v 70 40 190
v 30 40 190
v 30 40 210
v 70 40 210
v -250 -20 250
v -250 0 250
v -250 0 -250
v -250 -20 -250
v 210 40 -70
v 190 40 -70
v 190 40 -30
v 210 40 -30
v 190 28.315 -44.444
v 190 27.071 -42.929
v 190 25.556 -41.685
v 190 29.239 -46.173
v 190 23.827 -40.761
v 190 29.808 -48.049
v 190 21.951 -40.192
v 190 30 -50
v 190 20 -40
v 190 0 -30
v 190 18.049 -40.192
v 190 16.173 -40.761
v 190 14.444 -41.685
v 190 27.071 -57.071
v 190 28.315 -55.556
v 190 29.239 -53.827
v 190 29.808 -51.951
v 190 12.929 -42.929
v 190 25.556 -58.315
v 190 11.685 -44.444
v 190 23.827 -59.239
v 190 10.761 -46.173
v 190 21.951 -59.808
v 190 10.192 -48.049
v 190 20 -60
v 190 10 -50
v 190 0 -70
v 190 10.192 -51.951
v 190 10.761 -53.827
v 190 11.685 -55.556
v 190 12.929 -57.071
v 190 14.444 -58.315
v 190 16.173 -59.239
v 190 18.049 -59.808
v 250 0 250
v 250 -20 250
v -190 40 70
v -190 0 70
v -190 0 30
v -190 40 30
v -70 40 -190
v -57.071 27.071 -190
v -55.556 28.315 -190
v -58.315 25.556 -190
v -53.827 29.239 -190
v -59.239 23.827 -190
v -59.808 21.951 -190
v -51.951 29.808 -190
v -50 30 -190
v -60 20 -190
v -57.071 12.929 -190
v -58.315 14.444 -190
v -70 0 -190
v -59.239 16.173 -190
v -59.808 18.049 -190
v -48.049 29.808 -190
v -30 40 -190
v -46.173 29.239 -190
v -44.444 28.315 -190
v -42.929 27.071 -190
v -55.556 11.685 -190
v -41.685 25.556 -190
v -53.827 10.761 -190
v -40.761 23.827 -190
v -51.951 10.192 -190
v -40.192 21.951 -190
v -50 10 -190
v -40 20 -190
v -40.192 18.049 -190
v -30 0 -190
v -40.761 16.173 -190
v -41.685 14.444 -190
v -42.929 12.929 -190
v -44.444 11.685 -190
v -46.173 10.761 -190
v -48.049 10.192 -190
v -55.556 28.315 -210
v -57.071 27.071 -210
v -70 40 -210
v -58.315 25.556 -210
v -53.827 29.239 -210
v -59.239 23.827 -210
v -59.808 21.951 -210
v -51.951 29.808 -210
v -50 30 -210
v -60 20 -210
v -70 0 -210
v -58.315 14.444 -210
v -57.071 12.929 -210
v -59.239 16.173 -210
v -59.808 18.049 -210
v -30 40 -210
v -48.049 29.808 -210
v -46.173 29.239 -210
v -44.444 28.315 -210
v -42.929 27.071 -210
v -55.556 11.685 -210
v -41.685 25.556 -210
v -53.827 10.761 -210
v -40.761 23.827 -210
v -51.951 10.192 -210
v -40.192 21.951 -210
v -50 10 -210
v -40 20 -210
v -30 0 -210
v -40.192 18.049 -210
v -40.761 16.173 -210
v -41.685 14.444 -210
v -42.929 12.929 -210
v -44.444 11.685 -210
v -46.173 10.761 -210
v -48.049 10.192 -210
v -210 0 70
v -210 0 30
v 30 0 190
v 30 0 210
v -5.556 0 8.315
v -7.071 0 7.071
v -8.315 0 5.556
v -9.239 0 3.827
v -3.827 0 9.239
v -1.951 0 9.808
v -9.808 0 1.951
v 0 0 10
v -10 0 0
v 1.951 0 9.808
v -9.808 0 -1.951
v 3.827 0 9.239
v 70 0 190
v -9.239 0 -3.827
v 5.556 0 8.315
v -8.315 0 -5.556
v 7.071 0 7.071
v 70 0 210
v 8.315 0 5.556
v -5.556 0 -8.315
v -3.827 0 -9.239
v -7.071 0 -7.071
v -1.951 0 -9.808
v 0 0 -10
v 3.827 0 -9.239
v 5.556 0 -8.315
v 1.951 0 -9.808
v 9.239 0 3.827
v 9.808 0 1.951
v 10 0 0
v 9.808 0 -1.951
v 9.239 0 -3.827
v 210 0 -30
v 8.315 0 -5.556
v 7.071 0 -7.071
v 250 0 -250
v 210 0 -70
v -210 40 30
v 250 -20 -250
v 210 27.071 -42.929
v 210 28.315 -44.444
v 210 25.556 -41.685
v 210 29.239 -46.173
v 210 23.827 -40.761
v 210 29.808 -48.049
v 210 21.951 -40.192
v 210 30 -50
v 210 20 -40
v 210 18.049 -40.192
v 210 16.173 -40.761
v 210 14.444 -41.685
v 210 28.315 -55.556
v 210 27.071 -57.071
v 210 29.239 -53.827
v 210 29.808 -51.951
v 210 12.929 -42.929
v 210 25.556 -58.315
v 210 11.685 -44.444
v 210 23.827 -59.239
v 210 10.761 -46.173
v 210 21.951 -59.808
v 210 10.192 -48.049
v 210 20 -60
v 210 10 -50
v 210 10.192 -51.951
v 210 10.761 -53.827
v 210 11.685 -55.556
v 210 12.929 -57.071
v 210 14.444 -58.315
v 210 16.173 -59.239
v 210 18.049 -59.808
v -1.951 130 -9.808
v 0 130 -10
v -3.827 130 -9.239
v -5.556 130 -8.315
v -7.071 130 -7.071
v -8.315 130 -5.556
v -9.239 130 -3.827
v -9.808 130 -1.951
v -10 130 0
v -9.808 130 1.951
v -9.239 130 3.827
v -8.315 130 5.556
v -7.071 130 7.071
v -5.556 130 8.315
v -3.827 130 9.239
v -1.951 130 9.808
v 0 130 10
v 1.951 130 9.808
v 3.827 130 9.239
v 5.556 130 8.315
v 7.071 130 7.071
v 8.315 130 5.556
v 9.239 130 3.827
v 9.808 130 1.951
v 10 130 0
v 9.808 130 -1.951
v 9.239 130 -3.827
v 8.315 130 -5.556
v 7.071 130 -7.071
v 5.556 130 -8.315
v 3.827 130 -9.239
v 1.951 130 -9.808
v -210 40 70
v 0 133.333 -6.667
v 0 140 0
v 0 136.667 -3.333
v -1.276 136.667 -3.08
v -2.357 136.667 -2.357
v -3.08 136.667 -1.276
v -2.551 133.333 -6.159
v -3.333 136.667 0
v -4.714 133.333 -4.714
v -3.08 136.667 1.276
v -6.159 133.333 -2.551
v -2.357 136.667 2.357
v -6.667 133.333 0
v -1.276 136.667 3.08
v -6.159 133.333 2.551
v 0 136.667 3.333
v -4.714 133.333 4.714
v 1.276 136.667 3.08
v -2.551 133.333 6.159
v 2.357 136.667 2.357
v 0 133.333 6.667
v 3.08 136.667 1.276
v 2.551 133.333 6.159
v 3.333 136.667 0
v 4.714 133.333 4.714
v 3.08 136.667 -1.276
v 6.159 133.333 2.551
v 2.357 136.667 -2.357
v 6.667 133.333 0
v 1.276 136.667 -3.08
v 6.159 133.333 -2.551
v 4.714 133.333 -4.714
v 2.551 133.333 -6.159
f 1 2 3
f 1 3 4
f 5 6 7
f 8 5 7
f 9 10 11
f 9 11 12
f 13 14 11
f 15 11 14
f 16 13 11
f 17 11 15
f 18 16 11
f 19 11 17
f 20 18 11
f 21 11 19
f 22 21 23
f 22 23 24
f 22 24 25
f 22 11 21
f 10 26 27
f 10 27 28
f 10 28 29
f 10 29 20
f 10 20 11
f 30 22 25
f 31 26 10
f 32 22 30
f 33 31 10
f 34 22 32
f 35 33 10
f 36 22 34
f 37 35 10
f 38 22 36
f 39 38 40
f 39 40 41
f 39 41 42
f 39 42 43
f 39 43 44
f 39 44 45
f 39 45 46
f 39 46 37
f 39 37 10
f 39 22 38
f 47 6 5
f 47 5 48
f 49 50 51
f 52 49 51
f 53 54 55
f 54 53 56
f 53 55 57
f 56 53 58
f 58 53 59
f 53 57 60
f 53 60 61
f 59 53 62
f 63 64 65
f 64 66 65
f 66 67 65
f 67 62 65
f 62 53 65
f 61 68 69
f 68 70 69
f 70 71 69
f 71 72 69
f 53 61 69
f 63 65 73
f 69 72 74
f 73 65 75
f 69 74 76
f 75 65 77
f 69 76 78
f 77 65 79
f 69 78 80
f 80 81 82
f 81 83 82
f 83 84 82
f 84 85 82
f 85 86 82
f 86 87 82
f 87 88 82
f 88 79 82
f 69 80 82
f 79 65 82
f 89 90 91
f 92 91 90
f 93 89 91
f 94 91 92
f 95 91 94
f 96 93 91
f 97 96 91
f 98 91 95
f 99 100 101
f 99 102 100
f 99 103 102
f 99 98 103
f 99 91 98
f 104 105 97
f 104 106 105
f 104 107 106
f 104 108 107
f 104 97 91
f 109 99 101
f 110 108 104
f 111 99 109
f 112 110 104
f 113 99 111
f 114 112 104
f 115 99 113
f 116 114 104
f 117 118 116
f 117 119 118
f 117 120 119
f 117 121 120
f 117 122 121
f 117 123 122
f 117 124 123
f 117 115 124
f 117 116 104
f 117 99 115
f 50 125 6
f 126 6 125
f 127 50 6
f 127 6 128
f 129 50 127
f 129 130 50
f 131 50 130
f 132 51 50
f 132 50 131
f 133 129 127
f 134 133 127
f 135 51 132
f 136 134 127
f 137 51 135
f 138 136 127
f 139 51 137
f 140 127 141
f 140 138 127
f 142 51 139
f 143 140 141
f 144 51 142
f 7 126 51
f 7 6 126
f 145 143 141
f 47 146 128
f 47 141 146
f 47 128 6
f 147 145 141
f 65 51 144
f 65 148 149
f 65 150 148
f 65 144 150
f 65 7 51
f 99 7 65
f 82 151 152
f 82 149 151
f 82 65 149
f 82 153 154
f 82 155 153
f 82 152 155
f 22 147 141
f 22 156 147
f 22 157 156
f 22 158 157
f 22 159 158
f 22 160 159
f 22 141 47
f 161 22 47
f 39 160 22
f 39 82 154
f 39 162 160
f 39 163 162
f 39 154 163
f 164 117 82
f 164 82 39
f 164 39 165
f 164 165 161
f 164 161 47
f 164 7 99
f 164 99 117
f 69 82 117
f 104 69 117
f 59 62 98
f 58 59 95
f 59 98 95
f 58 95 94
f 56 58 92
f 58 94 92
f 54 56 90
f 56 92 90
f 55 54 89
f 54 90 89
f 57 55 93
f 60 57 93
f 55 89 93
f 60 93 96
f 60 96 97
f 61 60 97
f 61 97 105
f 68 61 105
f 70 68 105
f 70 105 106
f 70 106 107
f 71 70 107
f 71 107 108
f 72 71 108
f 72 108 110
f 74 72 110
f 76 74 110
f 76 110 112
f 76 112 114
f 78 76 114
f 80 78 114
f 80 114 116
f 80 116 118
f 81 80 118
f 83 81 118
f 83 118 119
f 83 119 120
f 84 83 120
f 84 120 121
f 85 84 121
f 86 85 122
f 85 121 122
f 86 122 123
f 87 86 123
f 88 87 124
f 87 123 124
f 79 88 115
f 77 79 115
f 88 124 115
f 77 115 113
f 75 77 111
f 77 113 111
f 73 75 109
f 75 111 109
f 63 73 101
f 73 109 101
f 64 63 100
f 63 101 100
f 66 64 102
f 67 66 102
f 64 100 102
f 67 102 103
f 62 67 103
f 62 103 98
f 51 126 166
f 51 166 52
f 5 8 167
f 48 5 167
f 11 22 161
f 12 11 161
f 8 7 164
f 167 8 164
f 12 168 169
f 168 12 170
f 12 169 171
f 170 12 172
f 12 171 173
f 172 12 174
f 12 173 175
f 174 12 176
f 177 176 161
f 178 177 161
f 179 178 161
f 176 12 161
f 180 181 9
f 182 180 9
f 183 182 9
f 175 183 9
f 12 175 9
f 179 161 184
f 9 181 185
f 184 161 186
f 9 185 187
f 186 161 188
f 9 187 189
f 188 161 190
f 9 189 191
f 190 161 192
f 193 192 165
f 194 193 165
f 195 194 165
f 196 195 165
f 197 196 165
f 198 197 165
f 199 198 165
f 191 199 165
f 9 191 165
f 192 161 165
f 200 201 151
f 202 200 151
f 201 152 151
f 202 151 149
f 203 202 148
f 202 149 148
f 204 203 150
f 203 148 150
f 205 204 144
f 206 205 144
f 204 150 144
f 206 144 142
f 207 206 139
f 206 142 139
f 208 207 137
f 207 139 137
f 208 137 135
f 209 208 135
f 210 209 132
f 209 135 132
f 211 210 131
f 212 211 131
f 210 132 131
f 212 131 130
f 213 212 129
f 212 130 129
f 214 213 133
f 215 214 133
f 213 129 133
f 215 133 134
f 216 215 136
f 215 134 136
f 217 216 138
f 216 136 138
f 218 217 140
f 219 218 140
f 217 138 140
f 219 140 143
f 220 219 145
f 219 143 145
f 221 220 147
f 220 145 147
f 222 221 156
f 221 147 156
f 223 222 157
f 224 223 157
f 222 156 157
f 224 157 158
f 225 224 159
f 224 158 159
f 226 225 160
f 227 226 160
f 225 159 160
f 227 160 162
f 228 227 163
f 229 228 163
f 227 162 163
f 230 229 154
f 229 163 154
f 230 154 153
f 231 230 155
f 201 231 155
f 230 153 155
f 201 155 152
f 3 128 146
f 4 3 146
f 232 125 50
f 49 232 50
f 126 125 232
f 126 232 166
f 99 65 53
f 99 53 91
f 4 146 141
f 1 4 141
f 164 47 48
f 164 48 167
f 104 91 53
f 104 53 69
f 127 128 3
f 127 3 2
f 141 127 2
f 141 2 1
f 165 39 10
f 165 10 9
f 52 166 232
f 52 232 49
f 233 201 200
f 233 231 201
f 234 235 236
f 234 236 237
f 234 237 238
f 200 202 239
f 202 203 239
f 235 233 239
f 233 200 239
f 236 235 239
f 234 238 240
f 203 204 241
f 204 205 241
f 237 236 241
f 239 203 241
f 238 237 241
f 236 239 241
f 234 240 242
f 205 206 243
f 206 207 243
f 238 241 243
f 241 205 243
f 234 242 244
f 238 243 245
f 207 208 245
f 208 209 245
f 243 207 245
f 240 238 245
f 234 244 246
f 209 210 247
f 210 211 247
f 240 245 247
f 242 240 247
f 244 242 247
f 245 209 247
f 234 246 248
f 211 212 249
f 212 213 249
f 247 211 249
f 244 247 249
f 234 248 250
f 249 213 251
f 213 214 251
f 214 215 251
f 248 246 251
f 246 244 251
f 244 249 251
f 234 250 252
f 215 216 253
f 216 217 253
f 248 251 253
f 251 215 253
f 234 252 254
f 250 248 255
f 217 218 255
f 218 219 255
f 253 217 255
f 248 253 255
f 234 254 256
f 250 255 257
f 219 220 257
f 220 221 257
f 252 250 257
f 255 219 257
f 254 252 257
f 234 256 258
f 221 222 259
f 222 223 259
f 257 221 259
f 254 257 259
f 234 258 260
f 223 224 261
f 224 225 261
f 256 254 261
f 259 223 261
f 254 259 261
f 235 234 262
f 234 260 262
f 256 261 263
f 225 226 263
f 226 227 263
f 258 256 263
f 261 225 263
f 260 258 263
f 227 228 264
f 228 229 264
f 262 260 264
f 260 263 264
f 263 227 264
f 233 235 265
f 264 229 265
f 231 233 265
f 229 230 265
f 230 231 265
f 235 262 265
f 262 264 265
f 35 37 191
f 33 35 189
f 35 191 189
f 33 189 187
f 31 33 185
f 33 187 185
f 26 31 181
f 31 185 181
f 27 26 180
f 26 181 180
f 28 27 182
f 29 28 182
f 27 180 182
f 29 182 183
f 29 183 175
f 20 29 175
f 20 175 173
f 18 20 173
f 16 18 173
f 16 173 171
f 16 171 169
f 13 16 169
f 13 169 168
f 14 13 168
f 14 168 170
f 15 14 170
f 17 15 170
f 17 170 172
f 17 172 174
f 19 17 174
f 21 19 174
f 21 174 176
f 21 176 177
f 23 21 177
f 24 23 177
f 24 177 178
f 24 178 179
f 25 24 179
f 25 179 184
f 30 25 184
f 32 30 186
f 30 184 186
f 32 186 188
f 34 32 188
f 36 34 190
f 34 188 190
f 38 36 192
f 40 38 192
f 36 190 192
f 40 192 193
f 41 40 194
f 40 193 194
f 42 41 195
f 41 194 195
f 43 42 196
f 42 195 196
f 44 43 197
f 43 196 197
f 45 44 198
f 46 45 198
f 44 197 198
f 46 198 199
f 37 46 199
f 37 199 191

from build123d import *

# Parameters (mm, degrees)
SKETCH1_W           = 500
SKETCH1_H           = 500
BOSS_EXTRUDE1_DEPTH = 20
SKETCH1_3_W         = 20
SKETCH1_3_H         = 40
SKETCH1_3_W_2       = 40
SKETCH1_3_H_2       = 20
BOSS_EXTRUDE2_DEPTH = 40
SKETCH5_R           = 10
CUT_EXTRUDE1_DEPTH  = 526.071423713
SKETCH6_R           = 10
CUT_EXTRUDE2_DEPTH  = 526.071423713


with BuildPart() as part:
    # Sketch1 → Boss-Extrude1 (new body)
    with BuildSketch(Plane(origin=(0, 0, 0), x_dir=(1, 0, 0), z_dir=(0, 1, 0))):
        Rectangle(SKETCH1_W, SKETCH1_H)
    extrude(amount=-BOSS_EXTRUDE1_DEPTH)

    # Sketch1<3> → Boss-Extrude2 (add)
    with BuildSketch(Plane(origin=(0, 0, 0), x_dir=(1, 0, 0), z_dir=(0, 1, 0))):
        with Locations((-200, -50)):
            Rectangle(SKETCH1_3_W, SKETCH1_3_H)
        with Locations((-50, 200)):
            Rectangle(SKETCH1_3_W_2, SKETCH1_3_H_2)
        with Locations((200, 50)):
            Rectangle(SKETCH1_3_W, SKETCH1_3_H)
        with Locations((50, -200)):
            Rectangle(SKETCH1_3_W_2, SKETCH1_3_H_2)
    extrude(amount=BOSS_EXTRUDE2_DEPTH)

    # Sketch5 → Cut-Extrude1 (cut, through all)
    with BuildSketch(Plane(origin=(0, 0, -210), x_dir=(-1, 0, 0), z_dir=(0, 0, -1))):
        with Locations((50, 20)):
            Circle(SKETCH5_R)
    extrude(amount=-CUT_EXTRUDE1_DEPTH, mode=Mode.SUBTRACT)

    # Sketch6 → Cut-Extrude2 (cut, through all)
    with BuildSketch(Plane(origin=(210, 0, 0), x_dir=(0, 0, -1), z_dir=(1, 0, 0))):
        with Locations((50, 20)):
            Circle(SKETCH6_R)
    extrude(amount=-CUT_EXTRUDE2_DEPTH, mode=Mode.SUBTRACT)

    # Sketch7 → Revolve1 (revolve)
    with BuildSketch(Plane(origin=(0, 0, 0), x_dir=(0, 0, -1), z_dir=(1, 0, 0))):
        Polygon((0, 0), (0, 140), (10, 130), (10, 0), align=None)
    revolve(axis=Axis((0, 0, 0), (0, 1, 0)))


solid = part.part
